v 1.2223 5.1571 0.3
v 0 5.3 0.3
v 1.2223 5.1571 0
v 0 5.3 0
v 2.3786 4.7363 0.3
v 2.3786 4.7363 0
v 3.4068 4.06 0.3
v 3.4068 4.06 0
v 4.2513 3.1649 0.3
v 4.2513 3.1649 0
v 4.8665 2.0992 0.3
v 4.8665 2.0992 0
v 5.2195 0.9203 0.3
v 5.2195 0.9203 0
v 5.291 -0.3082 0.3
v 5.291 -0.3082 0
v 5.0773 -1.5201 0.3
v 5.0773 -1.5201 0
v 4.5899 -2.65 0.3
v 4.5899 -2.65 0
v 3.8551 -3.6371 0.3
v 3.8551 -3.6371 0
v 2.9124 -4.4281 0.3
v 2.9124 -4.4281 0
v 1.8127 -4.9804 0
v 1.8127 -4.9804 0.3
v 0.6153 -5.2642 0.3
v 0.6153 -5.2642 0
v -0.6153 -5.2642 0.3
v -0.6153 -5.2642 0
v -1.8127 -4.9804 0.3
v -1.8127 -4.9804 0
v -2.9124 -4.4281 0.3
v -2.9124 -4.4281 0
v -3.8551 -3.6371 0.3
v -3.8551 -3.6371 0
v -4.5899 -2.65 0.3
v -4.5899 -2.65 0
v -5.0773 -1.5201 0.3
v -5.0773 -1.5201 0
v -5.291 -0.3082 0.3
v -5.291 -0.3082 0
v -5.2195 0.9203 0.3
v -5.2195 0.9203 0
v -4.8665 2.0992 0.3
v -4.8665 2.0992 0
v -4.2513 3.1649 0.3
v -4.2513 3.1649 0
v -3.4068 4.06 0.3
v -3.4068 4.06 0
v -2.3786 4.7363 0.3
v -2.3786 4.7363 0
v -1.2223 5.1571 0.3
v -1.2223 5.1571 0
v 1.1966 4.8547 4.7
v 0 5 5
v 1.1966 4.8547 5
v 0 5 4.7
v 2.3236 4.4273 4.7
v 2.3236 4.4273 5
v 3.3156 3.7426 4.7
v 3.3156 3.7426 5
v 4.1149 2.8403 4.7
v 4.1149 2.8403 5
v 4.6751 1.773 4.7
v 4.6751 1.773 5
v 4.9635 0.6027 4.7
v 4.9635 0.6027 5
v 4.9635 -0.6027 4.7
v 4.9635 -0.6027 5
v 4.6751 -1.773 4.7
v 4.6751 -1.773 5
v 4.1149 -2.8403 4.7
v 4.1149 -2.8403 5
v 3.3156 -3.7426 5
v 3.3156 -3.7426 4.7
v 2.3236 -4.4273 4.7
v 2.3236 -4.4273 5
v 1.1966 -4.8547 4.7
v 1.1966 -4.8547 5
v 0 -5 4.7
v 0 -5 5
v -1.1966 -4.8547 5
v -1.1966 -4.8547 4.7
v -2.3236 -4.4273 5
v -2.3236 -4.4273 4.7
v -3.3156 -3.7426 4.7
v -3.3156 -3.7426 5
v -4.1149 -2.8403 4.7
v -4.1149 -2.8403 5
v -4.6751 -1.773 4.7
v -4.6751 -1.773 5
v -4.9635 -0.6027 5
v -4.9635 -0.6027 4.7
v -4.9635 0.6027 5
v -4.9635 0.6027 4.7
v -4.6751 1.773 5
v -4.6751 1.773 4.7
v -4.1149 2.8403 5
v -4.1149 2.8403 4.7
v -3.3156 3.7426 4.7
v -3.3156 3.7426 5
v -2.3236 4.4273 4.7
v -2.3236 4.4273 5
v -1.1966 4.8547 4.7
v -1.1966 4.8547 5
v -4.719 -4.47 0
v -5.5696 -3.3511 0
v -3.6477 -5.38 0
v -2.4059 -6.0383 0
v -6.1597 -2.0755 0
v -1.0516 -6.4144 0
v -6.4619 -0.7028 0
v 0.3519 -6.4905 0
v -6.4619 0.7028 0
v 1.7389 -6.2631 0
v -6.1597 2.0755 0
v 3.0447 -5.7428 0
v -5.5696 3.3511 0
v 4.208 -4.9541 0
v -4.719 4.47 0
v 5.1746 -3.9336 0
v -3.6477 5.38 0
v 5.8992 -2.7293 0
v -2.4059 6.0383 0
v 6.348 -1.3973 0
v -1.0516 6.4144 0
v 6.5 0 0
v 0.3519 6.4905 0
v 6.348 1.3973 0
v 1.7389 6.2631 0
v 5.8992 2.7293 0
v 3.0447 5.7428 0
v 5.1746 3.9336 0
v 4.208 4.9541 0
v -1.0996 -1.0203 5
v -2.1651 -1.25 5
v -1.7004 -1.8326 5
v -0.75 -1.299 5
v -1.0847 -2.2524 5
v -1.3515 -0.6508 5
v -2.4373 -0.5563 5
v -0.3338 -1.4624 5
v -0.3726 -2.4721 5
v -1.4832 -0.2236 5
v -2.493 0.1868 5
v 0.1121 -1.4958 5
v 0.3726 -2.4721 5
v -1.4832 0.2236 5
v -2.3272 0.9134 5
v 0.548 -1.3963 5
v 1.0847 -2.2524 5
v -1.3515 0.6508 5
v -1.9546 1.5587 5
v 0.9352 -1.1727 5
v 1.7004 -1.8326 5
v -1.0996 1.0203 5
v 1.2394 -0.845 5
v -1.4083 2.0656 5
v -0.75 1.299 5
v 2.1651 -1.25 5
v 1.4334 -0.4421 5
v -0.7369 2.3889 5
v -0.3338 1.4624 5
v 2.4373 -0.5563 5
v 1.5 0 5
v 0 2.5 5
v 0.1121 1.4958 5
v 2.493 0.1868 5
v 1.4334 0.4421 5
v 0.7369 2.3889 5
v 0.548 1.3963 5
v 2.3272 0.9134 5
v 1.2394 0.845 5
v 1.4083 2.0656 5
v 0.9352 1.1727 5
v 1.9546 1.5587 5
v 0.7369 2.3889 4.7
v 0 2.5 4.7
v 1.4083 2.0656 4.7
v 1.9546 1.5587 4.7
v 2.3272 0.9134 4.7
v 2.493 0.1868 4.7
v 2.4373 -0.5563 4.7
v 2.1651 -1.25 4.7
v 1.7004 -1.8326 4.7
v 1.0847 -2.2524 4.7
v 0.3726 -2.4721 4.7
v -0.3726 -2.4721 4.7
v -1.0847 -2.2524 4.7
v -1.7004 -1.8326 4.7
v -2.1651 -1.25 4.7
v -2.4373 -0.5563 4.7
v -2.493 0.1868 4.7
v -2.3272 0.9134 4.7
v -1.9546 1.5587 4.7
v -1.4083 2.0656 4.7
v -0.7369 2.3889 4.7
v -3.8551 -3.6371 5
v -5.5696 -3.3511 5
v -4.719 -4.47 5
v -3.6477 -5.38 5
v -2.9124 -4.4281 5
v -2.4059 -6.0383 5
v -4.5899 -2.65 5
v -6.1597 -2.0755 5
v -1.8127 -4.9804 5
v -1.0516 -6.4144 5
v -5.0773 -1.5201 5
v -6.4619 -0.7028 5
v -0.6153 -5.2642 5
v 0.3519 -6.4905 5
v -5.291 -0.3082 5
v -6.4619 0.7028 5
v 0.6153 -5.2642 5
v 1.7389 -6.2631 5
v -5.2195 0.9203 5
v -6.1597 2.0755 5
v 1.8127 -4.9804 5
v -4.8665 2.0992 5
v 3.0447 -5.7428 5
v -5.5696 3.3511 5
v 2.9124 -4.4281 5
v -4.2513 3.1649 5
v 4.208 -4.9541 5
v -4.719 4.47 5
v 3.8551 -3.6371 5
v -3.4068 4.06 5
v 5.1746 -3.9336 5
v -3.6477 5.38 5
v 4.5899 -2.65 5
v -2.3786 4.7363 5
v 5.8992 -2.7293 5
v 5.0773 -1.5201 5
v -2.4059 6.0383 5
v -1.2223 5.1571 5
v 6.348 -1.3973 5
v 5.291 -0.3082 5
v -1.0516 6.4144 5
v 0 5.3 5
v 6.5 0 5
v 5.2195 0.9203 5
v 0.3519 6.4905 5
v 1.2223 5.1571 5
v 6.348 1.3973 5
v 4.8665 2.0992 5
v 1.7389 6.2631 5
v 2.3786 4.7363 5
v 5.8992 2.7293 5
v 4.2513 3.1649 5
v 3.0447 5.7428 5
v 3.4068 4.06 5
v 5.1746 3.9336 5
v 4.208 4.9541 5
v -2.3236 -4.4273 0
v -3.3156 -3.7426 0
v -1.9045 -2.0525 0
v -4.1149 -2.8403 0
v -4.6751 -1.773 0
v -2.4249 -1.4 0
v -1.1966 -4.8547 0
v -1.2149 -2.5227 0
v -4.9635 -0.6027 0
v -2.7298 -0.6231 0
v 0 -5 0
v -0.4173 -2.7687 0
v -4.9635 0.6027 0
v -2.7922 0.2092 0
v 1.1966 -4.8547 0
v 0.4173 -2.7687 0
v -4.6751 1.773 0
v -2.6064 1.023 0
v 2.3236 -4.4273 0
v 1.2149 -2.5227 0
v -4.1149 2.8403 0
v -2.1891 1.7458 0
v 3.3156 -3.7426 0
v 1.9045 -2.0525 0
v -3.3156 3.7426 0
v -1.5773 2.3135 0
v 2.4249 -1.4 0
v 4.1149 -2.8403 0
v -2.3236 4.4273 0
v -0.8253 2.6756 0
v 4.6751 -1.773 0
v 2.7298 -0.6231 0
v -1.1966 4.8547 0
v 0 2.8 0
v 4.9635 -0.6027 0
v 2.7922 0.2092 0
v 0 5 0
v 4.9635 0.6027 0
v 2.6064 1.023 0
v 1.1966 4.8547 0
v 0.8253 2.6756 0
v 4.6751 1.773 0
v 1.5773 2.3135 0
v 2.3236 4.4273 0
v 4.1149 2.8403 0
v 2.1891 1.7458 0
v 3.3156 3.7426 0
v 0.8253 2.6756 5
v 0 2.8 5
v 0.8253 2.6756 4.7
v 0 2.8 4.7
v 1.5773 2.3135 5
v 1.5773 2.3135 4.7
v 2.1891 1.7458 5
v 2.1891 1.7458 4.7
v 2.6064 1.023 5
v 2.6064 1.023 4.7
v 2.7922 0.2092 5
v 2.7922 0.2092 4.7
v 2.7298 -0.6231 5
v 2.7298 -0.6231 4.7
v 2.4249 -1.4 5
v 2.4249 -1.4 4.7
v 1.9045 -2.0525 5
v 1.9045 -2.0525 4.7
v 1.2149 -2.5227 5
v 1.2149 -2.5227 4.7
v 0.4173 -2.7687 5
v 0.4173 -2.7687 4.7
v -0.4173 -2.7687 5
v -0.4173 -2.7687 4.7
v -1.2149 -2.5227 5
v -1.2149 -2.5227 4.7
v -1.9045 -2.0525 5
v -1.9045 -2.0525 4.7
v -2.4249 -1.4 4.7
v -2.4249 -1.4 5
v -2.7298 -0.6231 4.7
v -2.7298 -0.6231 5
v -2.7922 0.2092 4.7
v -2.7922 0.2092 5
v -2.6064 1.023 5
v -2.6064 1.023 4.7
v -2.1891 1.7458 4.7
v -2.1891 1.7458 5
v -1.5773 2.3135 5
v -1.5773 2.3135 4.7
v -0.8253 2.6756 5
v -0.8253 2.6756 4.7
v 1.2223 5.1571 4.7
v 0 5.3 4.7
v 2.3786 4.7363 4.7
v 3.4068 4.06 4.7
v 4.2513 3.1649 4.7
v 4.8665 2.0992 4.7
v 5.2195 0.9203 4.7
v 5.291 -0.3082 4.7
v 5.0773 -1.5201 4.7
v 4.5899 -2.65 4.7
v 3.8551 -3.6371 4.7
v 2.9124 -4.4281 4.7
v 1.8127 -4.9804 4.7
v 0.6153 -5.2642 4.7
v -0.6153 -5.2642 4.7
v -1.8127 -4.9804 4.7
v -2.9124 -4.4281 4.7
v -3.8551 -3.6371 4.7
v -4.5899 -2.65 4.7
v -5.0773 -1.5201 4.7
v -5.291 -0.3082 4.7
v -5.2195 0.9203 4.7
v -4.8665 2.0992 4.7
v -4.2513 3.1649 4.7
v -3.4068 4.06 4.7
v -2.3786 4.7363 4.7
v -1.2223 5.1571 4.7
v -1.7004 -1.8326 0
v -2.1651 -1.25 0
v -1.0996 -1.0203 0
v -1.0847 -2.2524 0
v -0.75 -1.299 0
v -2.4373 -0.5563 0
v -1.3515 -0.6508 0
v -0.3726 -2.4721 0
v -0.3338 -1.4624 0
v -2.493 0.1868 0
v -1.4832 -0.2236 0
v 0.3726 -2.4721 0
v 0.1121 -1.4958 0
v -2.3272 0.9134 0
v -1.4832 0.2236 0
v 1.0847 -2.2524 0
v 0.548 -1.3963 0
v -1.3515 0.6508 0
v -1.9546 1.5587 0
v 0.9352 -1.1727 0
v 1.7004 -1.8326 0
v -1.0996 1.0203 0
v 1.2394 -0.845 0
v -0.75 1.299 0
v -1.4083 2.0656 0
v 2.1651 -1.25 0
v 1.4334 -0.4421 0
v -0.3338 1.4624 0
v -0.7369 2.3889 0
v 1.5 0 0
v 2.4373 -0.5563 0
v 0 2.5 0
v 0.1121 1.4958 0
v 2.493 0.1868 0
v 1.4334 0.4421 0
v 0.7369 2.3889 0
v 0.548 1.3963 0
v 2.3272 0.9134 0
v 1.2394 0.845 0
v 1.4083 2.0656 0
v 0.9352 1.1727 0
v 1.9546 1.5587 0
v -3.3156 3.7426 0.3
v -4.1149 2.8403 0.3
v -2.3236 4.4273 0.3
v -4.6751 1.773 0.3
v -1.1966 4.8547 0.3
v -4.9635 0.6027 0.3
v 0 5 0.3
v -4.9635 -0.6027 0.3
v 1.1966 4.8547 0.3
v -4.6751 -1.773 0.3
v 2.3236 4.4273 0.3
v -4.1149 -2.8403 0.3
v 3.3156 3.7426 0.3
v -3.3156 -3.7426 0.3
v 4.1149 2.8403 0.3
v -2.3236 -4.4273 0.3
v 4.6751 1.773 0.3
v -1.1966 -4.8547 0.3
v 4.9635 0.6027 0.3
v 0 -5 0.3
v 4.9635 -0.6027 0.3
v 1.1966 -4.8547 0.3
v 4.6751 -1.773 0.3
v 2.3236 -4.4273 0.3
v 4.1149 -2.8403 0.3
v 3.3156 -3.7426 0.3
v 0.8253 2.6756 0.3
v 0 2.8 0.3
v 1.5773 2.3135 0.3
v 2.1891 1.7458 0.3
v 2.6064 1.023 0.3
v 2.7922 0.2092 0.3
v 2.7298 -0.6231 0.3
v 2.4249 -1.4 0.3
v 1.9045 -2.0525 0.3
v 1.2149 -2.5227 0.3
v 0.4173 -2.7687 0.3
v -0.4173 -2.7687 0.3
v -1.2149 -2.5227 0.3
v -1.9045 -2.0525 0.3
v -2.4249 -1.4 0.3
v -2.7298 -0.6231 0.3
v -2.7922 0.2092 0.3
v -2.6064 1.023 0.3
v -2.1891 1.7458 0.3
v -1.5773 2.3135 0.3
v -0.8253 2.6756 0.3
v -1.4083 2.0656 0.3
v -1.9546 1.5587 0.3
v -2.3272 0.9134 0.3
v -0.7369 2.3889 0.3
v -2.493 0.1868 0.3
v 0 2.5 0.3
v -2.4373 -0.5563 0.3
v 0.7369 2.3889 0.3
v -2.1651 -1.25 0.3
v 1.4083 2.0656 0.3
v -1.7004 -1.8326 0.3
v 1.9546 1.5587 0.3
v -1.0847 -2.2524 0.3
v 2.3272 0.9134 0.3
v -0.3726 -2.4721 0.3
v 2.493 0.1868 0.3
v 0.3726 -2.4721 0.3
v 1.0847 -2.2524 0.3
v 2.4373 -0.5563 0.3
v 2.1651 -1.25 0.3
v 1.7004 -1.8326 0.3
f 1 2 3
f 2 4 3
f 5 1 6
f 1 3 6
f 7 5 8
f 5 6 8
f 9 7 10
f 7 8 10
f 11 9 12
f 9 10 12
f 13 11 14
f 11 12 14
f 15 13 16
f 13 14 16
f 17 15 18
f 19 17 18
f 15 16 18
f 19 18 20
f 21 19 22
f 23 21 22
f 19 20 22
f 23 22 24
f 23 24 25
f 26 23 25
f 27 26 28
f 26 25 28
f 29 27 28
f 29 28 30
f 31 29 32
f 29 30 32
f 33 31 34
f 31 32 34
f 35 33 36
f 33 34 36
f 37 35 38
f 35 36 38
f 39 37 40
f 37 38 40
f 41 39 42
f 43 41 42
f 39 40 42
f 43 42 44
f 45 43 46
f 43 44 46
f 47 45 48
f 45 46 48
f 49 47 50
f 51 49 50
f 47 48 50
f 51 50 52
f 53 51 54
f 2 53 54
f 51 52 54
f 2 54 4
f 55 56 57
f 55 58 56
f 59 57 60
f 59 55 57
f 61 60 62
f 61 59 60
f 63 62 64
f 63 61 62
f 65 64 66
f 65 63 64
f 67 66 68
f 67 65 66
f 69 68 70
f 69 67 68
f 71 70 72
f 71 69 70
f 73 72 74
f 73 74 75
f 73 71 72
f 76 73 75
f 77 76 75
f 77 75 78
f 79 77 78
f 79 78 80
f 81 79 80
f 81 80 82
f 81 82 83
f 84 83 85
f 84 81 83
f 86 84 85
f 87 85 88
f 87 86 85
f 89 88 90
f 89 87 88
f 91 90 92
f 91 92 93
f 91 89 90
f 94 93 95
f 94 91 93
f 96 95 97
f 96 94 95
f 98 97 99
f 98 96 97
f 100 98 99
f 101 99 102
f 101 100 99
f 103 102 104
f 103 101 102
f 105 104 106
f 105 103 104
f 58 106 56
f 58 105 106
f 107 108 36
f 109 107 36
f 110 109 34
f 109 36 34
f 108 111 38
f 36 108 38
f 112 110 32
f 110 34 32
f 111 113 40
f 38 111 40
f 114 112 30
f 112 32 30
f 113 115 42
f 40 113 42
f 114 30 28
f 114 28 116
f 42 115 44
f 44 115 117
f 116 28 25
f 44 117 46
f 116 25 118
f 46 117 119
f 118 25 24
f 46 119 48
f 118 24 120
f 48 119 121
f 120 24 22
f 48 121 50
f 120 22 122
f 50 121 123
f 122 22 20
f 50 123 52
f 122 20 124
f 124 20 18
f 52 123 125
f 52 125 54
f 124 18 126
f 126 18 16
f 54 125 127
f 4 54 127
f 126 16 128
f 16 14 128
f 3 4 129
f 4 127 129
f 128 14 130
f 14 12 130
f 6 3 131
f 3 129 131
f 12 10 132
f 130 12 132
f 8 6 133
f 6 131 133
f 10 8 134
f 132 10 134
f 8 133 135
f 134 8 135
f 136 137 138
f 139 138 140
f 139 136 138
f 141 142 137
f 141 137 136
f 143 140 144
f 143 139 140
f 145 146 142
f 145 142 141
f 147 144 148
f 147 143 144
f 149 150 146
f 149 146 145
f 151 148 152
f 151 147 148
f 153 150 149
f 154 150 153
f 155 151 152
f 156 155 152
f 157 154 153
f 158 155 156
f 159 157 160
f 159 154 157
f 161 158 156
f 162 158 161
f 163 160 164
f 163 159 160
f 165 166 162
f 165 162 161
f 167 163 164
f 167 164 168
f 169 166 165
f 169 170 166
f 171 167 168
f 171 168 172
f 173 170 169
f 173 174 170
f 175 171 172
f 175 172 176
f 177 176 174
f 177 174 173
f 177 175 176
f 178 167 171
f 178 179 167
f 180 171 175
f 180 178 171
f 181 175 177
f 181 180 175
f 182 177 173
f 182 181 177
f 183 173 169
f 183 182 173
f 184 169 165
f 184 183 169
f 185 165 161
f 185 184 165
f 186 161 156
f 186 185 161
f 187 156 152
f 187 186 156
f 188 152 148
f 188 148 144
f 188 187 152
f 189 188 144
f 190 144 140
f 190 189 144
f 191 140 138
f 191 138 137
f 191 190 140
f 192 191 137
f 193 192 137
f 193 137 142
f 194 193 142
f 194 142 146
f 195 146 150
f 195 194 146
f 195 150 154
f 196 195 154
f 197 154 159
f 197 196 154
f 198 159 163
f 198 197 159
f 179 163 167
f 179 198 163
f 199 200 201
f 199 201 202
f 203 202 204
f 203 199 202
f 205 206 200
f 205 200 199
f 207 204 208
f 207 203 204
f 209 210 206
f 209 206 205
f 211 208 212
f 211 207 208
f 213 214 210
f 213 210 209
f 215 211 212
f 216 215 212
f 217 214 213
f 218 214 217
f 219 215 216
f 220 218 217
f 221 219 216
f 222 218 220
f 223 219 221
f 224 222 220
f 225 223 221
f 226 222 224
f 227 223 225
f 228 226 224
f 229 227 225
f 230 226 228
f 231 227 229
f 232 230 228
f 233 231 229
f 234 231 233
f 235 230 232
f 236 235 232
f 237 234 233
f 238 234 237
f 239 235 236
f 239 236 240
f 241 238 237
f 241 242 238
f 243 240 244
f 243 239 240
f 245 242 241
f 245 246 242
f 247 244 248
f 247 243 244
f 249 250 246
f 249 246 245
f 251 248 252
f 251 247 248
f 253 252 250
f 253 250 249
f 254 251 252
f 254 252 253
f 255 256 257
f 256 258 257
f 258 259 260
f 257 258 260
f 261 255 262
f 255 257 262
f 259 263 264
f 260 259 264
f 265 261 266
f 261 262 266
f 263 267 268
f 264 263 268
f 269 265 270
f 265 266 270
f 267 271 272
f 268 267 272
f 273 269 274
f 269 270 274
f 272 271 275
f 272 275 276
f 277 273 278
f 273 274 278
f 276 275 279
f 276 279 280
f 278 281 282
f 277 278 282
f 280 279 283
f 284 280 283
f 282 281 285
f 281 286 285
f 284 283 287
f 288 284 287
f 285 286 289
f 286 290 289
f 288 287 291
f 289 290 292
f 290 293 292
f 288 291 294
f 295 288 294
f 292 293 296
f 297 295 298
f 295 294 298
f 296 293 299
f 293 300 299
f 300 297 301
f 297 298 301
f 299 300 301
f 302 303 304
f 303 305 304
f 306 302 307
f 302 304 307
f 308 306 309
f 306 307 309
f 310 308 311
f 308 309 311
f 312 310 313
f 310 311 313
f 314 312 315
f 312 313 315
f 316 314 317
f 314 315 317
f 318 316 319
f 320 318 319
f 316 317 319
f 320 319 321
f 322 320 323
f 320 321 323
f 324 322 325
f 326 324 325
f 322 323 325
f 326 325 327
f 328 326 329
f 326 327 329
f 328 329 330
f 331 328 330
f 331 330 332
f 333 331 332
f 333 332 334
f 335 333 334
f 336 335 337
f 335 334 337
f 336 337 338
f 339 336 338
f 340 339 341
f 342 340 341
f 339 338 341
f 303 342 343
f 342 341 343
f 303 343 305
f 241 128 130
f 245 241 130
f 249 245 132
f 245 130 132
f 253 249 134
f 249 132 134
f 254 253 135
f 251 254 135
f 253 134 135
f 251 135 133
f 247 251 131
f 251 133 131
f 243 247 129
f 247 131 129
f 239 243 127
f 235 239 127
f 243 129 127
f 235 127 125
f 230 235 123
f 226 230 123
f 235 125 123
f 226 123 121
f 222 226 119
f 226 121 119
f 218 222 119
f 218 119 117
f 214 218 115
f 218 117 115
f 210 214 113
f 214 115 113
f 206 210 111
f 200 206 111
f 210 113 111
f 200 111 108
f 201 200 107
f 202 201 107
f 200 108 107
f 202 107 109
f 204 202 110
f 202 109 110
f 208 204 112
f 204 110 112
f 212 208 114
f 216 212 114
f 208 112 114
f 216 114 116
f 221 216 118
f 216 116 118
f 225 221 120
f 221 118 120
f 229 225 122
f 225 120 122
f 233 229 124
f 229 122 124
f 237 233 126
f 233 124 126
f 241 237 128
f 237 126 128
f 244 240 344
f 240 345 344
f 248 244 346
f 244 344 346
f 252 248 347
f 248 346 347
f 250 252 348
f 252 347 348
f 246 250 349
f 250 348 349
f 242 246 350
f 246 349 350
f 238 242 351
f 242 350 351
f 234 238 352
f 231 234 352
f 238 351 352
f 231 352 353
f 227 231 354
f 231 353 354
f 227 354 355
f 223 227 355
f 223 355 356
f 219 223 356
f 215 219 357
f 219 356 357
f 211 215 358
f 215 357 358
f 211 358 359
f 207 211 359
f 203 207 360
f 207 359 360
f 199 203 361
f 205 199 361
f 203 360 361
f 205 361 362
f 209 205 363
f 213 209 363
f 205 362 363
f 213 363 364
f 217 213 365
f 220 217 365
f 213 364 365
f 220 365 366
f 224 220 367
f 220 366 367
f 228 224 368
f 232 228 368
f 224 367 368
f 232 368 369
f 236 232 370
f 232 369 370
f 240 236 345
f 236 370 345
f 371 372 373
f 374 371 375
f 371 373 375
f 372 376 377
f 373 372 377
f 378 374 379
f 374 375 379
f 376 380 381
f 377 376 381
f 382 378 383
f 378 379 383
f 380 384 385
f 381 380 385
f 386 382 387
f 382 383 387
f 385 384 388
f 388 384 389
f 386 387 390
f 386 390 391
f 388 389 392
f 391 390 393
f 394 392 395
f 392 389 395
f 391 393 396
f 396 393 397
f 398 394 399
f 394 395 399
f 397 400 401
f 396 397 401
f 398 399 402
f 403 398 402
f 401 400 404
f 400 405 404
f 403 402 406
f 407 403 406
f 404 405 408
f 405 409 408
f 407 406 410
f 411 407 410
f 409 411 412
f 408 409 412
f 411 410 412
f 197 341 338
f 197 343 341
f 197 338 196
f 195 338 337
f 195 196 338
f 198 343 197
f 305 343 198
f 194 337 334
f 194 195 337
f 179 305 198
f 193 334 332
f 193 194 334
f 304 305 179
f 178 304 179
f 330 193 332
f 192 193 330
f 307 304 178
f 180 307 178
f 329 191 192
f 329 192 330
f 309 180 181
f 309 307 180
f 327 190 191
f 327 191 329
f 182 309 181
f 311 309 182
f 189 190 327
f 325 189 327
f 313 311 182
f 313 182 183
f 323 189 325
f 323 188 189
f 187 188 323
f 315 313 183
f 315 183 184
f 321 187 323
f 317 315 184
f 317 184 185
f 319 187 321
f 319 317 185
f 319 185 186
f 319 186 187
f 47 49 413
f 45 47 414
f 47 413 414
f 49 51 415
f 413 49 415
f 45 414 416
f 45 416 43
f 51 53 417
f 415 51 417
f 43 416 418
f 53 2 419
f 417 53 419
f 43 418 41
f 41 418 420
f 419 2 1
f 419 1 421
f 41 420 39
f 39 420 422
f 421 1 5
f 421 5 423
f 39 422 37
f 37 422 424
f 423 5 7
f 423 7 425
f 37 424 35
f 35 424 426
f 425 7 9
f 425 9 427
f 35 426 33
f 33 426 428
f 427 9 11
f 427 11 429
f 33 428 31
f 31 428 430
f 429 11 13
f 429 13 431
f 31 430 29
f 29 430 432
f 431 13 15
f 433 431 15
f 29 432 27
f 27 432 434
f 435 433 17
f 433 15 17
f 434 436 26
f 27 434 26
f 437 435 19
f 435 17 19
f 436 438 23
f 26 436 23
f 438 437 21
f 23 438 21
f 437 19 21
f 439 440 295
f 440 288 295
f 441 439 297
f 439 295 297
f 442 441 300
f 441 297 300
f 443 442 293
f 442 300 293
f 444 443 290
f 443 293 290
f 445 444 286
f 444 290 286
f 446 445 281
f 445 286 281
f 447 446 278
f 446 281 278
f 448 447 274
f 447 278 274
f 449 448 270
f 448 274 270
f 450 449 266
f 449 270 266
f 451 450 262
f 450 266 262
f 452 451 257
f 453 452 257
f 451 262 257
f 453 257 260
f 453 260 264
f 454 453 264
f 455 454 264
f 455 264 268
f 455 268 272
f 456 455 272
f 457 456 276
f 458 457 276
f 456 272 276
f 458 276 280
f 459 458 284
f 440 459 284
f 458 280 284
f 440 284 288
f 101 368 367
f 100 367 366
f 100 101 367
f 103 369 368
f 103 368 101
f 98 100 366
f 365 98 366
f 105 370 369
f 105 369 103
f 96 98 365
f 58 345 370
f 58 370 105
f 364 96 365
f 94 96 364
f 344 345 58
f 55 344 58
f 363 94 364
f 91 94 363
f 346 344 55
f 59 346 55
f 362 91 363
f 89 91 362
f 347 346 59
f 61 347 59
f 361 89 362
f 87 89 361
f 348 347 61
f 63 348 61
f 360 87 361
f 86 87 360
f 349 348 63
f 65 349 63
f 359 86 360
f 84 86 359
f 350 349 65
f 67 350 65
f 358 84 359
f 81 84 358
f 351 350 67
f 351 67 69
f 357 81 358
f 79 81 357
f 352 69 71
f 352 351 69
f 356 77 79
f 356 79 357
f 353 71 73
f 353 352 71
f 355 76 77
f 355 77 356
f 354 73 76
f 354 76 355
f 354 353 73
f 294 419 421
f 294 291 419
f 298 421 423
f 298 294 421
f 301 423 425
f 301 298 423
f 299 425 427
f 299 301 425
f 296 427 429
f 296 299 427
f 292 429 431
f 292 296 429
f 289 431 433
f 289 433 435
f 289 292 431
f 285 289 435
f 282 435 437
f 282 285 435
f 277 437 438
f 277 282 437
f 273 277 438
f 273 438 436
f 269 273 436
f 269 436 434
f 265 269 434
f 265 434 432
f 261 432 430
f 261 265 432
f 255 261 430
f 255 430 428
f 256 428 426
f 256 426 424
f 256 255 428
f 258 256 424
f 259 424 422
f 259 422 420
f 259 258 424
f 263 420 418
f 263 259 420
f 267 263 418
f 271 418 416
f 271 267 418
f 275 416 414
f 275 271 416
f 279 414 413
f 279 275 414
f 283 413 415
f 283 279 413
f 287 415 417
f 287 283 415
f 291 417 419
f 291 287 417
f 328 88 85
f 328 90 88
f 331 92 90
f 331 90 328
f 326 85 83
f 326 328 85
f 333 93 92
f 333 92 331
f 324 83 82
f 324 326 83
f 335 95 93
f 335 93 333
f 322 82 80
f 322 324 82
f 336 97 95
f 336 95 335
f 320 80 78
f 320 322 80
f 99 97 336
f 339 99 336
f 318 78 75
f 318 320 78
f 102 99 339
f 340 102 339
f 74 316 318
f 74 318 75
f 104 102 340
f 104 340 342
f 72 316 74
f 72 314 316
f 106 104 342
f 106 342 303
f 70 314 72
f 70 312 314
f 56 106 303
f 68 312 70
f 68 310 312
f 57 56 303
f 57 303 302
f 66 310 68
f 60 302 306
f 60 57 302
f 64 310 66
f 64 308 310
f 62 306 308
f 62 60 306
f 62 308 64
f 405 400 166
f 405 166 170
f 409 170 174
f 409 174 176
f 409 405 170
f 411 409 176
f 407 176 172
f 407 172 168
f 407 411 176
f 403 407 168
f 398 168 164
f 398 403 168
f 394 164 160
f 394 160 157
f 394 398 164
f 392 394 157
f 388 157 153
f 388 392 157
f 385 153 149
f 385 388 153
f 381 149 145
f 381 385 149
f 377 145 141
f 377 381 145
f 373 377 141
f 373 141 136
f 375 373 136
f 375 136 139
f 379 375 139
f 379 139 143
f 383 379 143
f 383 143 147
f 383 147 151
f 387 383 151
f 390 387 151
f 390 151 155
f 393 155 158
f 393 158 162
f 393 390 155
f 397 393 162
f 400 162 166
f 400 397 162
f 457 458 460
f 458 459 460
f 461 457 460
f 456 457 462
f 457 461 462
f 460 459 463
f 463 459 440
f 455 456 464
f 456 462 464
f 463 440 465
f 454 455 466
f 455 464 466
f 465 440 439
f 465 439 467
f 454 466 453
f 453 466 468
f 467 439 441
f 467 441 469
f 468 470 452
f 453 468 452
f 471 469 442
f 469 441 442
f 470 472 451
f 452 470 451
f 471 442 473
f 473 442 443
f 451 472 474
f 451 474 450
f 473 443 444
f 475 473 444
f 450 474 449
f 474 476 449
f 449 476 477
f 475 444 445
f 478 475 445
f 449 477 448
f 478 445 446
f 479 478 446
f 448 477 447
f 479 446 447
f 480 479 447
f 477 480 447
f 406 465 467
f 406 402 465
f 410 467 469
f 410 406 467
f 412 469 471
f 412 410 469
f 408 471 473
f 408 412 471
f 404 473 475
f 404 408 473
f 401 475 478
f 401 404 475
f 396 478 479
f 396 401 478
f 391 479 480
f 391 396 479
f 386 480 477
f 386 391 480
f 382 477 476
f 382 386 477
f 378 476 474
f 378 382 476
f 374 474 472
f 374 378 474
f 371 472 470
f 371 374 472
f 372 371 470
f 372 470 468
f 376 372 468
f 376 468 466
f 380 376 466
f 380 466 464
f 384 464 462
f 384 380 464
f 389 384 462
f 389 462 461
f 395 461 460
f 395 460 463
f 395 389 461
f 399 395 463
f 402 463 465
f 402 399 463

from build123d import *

# Parameters (mm, degrees)
ESQUISSE1_R        = 6.5
ESQUISSE1_R_2      = 1.5
BOSS_EXTRU_1_DEPTH = 5
ESQUISSE3_W        = 0.3
ESQUISSE3_H        = 0.3


with BuildPart() as part:
    # Esquisse1 → Boss.-Extru.1 (new body)
    with BuildSketch(Plane.XY):
        Circle(ESQUISSE1_R)
        Circle(ESQUISSE1_R_2, mode=Mode.SUBTRACT)
    extrude(amount=BOSS_EXTRU_1_DEPTH)

    # Esquisse3 → Enlèvement de matière-Révolution1 (revolve, cut)
    with BuildSketch(Plane(origin=(0, 0, 0), x_dir=(0, 0, -1), z_dir=(1, 0, 0))):
        with Locations((-4.85, 2.65)):
            Rectangle(ESQUISSE3_W, ESQUISSE3_H)
        with Locations((-0.15, 2.65)):
            Rectangle(ESQUISSE3_W, ESQUISSE3_H)
        with Locations((-4.85, 5.15)):
            Rectangle(ESQUISSE3_W, ESQUISSE3_H)
        with Locations((-0.15, 5.15)):
            Rectangle(ESQUISSE3_W, ESQUISSE3_H)
    revolve(axis=Axis((0, 0, 5.25), (0, 0, -1)), mode=Mode.SUBTRACT)


solid = part.part
